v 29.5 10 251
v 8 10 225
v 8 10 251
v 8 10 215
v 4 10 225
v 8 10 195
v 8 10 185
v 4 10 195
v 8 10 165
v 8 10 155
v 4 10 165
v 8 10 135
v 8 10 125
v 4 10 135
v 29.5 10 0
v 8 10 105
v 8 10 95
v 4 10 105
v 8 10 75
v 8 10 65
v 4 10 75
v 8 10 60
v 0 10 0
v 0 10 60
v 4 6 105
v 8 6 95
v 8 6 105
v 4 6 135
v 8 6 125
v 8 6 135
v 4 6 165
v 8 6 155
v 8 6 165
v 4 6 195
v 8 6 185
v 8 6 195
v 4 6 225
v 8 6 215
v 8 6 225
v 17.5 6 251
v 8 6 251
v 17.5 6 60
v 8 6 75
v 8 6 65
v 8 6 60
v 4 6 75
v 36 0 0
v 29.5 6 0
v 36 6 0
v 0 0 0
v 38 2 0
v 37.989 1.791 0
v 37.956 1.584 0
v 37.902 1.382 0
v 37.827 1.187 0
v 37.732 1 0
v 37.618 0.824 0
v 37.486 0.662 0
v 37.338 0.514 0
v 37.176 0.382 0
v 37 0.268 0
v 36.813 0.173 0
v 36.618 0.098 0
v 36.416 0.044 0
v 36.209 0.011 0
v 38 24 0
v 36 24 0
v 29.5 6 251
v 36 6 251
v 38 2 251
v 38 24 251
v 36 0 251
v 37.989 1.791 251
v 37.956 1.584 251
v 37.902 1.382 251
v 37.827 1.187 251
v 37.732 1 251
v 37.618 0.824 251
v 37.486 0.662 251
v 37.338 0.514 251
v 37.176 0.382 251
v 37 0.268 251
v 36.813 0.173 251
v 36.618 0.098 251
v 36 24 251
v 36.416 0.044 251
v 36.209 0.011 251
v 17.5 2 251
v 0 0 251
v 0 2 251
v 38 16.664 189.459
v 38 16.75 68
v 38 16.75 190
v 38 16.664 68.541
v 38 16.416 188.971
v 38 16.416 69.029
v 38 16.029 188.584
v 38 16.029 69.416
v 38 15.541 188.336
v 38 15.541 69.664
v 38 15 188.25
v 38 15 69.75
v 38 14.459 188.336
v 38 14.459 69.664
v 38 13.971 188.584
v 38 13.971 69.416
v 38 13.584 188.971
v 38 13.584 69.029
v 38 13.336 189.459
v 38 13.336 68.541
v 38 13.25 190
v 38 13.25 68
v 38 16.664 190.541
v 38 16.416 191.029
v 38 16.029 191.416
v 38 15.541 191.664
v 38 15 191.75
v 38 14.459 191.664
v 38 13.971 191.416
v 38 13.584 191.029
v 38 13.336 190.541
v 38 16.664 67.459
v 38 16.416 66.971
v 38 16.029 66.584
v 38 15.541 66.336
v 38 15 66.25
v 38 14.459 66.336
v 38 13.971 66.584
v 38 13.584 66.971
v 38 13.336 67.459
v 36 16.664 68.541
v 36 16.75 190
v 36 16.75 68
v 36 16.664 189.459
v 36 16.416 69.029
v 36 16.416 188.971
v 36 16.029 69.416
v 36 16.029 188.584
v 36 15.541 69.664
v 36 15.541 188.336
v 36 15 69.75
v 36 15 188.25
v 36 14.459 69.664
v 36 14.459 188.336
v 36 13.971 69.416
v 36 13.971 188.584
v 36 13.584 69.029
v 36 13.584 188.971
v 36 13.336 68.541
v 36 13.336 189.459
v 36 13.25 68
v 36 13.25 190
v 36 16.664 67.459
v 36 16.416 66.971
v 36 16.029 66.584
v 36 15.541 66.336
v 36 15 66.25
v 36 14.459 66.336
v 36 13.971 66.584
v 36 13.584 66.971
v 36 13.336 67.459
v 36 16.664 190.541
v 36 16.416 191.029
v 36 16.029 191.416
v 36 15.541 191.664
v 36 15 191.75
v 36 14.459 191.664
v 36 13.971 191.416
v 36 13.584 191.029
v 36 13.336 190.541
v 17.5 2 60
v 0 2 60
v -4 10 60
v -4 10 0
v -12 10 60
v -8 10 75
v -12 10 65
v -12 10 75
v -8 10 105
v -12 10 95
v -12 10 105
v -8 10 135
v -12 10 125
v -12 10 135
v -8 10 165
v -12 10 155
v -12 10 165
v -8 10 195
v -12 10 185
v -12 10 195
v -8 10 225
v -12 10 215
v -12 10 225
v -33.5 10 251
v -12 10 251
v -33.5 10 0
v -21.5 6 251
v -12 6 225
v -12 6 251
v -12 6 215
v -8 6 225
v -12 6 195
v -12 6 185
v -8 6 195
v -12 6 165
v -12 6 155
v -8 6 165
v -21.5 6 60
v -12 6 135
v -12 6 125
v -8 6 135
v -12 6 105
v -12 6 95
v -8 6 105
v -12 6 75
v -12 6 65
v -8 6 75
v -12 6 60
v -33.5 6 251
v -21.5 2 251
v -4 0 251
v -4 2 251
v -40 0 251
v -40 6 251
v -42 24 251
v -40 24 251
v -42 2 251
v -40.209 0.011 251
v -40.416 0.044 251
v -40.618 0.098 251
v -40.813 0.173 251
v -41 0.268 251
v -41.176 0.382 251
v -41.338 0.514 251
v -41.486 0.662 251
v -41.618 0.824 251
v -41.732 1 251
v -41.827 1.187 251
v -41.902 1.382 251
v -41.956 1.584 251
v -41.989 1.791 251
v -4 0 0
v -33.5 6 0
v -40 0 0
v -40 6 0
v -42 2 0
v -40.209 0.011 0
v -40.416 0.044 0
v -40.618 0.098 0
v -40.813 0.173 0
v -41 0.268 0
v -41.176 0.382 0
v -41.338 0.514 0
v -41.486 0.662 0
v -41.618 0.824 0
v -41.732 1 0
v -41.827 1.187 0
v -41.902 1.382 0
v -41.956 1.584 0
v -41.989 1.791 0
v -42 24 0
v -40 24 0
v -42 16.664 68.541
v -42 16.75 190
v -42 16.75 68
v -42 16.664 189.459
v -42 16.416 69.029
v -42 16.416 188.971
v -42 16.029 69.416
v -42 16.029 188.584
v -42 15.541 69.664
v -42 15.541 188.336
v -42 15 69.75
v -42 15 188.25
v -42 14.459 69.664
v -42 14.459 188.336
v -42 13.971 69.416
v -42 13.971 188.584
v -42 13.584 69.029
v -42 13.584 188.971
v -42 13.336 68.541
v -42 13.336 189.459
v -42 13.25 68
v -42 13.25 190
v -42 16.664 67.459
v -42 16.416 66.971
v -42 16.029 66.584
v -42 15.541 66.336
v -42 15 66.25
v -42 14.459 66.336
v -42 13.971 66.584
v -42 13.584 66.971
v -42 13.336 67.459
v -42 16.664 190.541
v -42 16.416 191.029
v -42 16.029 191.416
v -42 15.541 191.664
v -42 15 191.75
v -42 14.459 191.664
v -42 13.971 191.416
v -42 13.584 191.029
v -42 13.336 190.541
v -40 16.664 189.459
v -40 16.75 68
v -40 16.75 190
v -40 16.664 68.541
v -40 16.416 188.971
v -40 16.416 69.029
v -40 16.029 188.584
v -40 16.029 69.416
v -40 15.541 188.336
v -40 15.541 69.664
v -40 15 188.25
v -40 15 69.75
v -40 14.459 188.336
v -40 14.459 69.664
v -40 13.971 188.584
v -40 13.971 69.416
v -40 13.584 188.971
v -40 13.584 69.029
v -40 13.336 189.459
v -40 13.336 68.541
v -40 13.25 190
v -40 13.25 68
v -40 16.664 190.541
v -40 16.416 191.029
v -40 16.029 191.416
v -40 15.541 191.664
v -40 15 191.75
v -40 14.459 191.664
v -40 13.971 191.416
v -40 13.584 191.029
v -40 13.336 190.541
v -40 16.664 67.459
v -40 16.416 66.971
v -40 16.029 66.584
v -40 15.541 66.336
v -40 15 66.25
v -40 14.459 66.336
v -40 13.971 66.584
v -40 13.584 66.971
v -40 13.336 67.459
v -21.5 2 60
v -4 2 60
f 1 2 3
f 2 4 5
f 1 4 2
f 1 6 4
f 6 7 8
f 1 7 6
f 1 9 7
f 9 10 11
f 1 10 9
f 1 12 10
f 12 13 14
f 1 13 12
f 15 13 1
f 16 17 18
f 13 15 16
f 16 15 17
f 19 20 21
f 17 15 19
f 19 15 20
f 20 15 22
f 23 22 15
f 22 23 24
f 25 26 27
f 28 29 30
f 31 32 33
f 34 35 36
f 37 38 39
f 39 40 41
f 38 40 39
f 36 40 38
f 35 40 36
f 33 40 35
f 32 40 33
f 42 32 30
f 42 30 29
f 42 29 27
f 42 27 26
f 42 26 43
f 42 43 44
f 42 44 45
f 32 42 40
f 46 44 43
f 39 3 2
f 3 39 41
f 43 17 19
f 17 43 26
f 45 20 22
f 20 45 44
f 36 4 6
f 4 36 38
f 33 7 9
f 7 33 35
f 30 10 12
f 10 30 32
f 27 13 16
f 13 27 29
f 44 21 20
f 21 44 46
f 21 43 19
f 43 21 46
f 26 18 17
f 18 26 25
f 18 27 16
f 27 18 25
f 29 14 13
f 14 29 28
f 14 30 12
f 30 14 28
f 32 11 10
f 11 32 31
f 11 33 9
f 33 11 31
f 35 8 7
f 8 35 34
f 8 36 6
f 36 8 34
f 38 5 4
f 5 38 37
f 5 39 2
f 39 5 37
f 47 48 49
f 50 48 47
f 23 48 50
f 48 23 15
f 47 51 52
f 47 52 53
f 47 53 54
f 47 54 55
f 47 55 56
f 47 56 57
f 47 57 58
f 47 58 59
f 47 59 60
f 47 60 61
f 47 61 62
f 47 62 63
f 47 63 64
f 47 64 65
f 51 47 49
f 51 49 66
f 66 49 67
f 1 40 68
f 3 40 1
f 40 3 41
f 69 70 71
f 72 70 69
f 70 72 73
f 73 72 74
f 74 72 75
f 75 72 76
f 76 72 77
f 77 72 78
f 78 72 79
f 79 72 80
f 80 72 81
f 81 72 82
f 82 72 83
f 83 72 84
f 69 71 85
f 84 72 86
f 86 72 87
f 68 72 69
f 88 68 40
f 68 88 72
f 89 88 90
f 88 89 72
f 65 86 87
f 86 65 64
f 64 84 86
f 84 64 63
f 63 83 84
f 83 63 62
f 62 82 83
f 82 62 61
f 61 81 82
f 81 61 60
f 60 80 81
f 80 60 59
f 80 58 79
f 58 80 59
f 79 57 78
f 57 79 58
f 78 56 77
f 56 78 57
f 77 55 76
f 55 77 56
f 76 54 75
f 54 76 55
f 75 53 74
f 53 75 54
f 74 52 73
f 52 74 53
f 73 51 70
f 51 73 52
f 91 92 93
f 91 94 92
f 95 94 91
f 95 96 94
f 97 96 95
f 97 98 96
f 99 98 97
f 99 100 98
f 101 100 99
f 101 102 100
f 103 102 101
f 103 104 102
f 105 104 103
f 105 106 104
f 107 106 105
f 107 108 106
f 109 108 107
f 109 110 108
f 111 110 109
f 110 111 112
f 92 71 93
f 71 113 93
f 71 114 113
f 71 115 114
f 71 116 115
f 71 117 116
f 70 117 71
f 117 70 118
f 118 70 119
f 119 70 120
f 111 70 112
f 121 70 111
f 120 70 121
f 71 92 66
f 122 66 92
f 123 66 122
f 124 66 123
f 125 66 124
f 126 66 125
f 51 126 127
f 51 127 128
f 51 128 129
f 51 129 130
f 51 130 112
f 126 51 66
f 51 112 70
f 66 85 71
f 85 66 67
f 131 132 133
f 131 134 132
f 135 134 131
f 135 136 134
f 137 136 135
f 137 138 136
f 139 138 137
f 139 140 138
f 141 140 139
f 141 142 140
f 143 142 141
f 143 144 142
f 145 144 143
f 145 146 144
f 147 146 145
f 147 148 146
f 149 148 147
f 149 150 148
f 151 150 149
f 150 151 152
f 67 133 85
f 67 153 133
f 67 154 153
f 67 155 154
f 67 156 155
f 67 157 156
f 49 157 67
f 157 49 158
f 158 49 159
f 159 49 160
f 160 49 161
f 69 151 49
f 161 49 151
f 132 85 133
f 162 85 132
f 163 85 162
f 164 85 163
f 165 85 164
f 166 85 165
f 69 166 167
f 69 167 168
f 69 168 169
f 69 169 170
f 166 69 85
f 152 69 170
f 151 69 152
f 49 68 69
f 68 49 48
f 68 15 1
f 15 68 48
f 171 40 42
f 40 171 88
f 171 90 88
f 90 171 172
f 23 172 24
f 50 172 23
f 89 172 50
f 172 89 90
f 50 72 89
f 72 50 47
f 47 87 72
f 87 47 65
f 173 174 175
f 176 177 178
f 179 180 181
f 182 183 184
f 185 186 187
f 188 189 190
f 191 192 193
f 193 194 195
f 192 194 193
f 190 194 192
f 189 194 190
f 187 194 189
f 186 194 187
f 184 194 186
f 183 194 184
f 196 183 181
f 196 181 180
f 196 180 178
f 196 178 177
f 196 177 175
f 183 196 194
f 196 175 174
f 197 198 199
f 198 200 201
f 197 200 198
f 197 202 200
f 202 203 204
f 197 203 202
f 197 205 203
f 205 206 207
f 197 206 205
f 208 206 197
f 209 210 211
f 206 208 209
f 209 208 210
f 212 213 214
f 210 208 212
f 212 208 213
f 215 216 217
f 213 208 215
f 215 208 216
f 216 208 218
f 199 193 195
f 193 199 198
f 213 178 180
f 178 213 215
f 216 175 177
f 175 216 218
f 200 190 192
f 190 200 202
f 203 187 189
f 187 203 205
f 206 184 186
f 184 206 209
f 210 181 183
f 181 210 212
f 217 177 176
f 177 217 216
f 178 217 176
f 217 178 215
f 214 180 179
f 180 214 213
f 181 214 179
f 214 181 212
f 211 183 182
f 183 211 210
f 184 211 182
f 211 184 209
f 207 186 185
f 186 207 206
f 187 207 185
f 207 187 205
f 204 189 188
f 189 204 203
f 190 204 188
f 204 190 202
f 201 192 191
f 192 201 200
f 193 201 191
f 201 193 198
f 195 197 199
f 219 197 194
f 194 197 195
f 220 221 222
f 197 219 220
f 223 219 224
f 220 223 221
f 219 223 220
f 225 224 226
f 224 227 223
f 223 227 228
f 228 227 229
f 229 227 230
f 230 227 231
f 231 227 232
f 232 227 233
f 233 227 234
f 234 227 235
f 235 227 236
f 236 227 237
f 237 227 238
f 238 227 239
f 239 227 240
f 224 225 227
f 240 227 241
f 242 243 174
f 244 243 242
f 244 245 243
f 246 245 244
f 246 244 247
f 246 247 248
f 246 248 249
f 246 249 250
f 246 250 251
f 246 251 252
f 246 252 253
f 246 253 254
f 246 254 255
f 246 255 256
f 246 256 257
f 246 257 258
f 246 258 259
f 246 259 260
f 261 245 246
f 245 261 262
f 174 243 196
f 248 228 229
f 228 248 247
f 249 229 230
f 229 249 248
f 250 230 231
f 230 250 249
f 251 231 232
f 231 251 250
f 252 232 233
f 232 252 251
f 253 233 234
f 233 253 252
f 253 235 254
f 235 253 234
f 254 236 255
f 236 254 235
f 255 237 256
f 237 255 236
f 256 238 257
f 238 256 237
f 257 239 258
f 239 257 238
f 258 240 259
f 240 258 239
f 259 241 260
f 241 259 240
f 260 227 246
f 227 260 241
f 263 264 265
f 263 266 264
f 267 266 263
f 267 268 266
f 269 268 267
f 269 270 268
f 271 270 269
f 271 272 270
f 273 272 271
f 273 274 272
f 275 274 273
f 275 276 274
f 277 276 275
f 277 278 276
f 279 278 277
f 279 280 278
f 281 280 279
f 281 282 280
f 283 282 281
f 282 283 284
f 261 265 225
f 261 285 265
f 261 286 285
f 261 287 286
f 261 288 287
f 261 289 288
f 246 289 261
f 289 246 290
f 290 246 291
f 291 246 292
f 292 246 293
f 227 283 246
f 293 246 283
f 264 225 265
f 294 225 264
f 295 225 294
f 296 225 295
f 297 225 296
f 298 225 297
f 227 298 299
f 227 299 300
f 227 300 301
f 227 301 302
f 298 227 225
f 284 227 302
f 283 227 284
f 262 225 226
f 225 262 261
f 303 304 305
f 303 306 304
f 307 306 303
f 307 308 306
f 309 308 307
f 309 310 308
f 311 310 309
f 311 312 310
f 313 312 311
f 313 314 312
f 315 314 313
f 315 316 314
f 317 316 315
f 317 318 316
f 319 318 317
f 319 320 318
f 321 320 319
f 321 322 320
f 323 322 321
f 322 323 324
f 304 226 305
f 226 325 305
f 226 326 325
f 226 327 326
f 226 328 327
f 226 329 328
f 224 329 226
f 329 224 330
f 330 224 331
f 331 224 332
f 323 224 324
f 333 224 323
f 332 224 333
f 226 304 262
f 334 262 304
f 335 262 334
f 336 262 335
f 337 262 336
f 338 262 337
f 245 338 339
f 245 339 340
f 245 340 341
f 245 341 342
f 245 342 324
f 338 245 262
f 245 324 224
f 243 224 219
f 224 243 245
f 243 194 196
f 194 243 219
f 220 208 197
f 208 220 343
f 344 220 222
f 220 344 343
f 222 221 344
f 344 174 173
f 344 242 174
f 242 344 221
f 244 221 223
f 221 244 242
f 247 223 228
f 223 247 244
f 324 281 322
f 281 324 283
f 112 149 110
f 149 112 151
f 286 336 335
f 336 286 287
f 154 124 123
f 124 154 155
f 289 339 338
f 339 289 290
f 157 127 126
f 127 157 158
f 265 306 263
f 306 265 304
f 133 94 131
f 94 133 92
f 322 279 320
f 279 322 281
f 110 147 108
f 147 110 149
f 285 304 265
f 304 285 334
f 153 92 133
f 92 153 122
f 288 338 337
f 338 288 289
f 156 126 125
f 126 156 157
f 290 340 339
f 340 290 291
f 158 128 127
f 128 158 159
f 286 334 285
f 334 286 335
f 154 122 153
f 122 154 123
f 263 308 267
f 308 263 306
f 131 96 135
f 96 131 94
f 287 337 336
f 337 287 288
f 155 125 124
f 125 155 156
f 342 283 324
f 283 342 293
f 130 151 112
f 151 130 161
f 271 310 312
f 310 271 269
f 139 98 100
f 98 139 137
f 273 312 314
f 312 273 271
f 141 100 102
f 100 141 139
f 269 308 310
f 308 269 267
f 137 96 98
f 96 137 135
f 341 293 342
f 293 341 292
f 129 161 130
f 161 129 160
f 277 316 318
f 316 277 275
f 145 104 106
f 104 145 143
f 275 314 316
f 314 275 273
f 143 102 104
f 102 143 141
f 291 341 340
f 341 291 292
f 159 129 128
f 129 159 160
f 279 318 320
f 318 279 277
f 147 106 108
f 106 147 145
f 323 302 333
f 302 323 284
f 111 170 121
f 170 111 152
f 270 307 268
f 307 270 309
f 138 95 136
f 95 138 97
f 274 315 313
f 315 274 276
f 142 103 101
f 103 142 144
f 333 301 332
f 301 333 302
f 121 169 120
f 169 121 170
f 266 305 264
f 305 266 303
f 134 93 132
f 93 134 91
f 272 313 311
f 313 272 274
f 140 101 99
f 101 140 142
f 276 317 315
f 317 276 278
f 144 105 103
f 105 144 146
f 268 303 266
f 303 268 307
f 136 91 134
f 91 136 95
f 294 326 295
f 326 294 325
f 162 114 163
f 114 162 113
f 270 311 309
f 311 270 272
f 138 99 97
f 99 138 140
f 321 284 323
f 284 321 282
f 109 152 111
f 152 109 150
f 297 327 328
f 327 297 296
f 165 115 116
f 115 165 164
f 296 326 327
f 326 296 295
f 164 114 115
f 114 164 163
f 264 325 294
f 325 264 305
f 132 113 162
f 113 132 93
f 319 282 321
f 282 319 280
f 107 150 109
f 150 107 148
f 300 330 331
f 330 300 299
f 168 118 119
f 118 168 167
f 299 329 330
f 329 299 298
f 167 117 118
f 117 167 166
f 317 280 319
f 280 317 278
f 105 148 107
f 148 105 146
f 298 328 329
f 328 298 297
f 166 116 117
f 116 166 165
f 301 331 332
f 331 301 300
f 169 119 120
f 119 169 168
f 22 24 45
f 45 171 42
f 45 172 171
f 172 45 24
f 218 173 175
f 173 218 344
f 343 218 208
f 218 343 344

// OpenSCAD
// Allow a tollerance on the acrylic width
// e.g. 3mm acrylic can be 3.5 or even 4 in places.
acrylicWidth = 4;

// Ultimaker Extended
extended = true;

includeLowerSections = true;
includeUpperSections = false; 
includeLeftSections = true;
includeRightSections = true;

// debug support
includeVisualisation = false;
testPiece = false;

// Include knotches on the inside surface to help latch the sliding door.
knotches = true;
knotchSpacing = 30;

// How much of the base part is filled to 
// stop the door going all the way down
// 60mm gives just above display
filledHeight = 60;

distanceBetweenHoles = 122;
ultimakerWidth = 339; 

seperationBetweenSides = 0;
// -32 for offset in right bracked.
//seperationBetweenSides = ultimakerWidth - (38*2);
// gives 0 width for ultimaker inbeterrn
 //seperationBetweenSides = -(38*2);

module showUltimaker() {
    // down 2mm as the runners are raised up by 2mm.
    translate([-(ultimakerWidth-38 +2) ,11,-2]) {
        cube([ultimakerWidth,200,490]);
        
        // Show Screws.
        translate([0,5-1,0]) {
            for (zOfffset = [69-1 : distanceBetweenHoles : 480]) {           
                translate([0,0,zOfffset]) {
                    cube([400,2,2]);
                }
            }
        }
    }
}

module showDoor() {
xOffset = -(ultimakerWidth-38 +2) + 19;

    translate([xOffset ,2,15]) {
        % cube([300,acrylicWidth,500]);
    }
}

module bracket(h) {
    linear_extrude(height = h) { 
        //+4 on the x.
        //polygon(points=[[0,0],[34,0],[34,25],[32,25],[32,7],[25.5,7],[25.5,11],[4,11],[4,8],[19,8],[19,2],[0,2], [0,0]]);
        
        difference() {
            union() {
                polygon(points=[[0,0],[36,0],[38,2],[38,20+acrylicWidth],[36,20+acrylicWidth],[36,2+acrylicWidth],[29.5,2+acrylicWidth],[29.5,6+acrylicWidth],[8,6+acrylicWidth],[8,2+acrylicWidth],[17.5,2+acrylicWidth],[17.5,2],[0,2], [0,0]]);
                
                translate([36,2,0]) {
                    // 4.2mm hole allows for a M3 pushfit nut
                    // or small cable/string run inside
                    circle(d=4, $fn=60);
                }
            }
            union() {
                translate([23,4,0]) {
                    // 4.2mm hole allows for a M3 pushfit nut
                    // or small cable/string run inside
                   // circle(d=4.2, $fn=60);
                }
            }
        }
    }
}



// Well, more take them away
module addRightKnotches(h) {
    // start at 15mm as this keeps the underside
    // vent gap in the Ultimaker open
    for (zOffset = [15: knotchSpacing: h]) {
        translate([0,6+acrylicWidth, zOffset]) {
            rotate([0,90,-90]) {
                linear_extrude(height = 4) { 
                    polygon(points=[[0,0],[10,4],[0,4],[0,0]]);
                }
            }
        }
    }
}

module addLeftKnotches(h) {
    // start at 15mm as this keeps the underside
    // vent gap in the Ultimaker open
    for (zOffset = [15: knotchSpacing: h]) {
        translate([-3,6+acrylicWidth, zOffset]) {
            rotate([0,90,-90]) {
                linear_extrude(height = 4) { 
                    polygon(points=[[10,0],[10,0],[0,4],[00,0]]);
                }
            }
        }
    }
}

module rightBracket (h)  {
    bracket(h);
    if (knotches) {
        translate([4,0,0]) {
            addRightKnotches(h);
        }
    }
}

module leftBracket (h)  {
    translate([-4,0,h]) {
        rotate([0,180,0]) {
            bracket(h);
        }
    }
    if (knotches) {
        translate([-9,0,0]) {
            addLeftKnotches(h);
        }
    }
}    

module screwHole(zPosition) {
    translate([-395,0,zPosition]) {
        rotate([0,90,0]) {
            #cylinder(d=3.5, h=600, $fn=20);
        }
    }
}

module main(h, firstHoleZ, fillBase) {
    // for 2 sections to make a door on extended
    
    echo ("Height = ", h);
    echo ("First Hole At = ", firstHoleZ);
    
    difference() {
        union() {
            if (includeRightSections) {
                rightBracket(h);            
            }
            
            if (includeLeftSections) {
                translate([-seperationBetweenSides,0,0]) {
                   leftBracket(h);    
                }
            }
        }
        union() {
            translate([34-3,11+acrylicWidth,0]) {
                // Holes distance from top which actually becomes the bottom
                screwHole(firstHoleZ);
                screwHole(firstHoleZ+distanceBetweenHoles);
            }
        }
    }   
    
    // fill the bottom(/top) to stop acrylic calling out.
    if (fillBase) {
        if (includeRightSections) {
            cube([20, 6 + acrylicWidth, filledHeight]);
        }
        
        if (includeLeftSections) {
            translate([-seperationBetweenSides-24,0,0]) {
                cube([20, 6 + acrylicWidth, filledHeight]);
            }
        }
    }
}



// Help visualise if we have the screwholes in the correct place.
module lowerSectionMarker() {
    translate([30,10,0]) {
        // first hole
        cube([10,10,70]);
        // second hole
        translate([0,10,0]) cube([10,10,70+122]);
        // top
        translate([0,20,0]) cube([10,10,70+122+61]);
    }
}

module upperSectionMarker() {
    translate([30,10,0]) {
        // first hole
        cube([10,10,61]);
        // second hole
        translate([0,10,0]) cube([10,10,61+122]);
        // top
        translate([0,20,0]) cube([10,10,61+122+61]);
    }
}

module extendedUpperDoorRunners() {
    // Set-up so that 2 pieced
    // can be stacked on top of each other
    
    // For upper parts.
    lowerPartHeight = (distanceBetweenHoles/2); // 122/2 == 61mm.
    
    // 28mm lower in height to so they don't jut over the top.
    height = lowerPartHeight + (distanceBetweenHoles) + (distanceBetweenHoles/2) - 27; 
    
    main(height, lowerPartHeight, false);
}

module extendedLowerDoorRunners() {
    // For base parts
    // actual first hole at 70mm
    // leaves 2mm gap on floor
    lowerPartHeight = 68; 
    
    height = lowerPartHeight + (distanceBetweenHoles) + (distanceBetweenHoles/2); // distance between screw holes.
    
    main(height, lowerPartHeight, true);
}

module extendedDoorRunners() {
    // Set-up so that 2 pieced
    // can be stacked on top of each other
    if (includeUpperSections) {
        // For Printing
        translate([0,30,0]) {
        // For Visualisation
        //translate([0,0,68 + 122 + 61 + 0.5]) {
            extendedUpperDoorRunners();
        }
    }
        
    if (includeLowerSections) {
        extendedLowerDoorRunners();
    }
}

module regularDoorRunners() {
    if (includeUpperSections) {
        // For Printing
        translate([0,30,0]) {
            // For Visualisation
            //translate([0,0,68 + 122 + 61 + 0.5]) {
            height =  distanceBetweenHoles + distanceBetweenHoles/2;
            main(height, 0, false);
        }
    }
    
    if (includeLowerSections) {
        // Joint is in the middle of the second screw.
        height = 68 + distanceBetweenHoles;
        main(height, 68, true);
    }
}


// Application flow...

if (testPiece) {
    // Print test pieces for fit.
    main(10, 5, false);
} else {

    if (extended) {
        extendedDoorRunners();
    } else {
        regularDoorRunners();
    }

    if (includeVisualisation) {

        // Visualisation
        %showUltimaker();
        %showDoor();

        translate([0,0,251.5]) {
            %upperSectionMarker();
        }

        translate([0,0,-2]) {
            %lowerSectionMarker();
        }
    }
}
